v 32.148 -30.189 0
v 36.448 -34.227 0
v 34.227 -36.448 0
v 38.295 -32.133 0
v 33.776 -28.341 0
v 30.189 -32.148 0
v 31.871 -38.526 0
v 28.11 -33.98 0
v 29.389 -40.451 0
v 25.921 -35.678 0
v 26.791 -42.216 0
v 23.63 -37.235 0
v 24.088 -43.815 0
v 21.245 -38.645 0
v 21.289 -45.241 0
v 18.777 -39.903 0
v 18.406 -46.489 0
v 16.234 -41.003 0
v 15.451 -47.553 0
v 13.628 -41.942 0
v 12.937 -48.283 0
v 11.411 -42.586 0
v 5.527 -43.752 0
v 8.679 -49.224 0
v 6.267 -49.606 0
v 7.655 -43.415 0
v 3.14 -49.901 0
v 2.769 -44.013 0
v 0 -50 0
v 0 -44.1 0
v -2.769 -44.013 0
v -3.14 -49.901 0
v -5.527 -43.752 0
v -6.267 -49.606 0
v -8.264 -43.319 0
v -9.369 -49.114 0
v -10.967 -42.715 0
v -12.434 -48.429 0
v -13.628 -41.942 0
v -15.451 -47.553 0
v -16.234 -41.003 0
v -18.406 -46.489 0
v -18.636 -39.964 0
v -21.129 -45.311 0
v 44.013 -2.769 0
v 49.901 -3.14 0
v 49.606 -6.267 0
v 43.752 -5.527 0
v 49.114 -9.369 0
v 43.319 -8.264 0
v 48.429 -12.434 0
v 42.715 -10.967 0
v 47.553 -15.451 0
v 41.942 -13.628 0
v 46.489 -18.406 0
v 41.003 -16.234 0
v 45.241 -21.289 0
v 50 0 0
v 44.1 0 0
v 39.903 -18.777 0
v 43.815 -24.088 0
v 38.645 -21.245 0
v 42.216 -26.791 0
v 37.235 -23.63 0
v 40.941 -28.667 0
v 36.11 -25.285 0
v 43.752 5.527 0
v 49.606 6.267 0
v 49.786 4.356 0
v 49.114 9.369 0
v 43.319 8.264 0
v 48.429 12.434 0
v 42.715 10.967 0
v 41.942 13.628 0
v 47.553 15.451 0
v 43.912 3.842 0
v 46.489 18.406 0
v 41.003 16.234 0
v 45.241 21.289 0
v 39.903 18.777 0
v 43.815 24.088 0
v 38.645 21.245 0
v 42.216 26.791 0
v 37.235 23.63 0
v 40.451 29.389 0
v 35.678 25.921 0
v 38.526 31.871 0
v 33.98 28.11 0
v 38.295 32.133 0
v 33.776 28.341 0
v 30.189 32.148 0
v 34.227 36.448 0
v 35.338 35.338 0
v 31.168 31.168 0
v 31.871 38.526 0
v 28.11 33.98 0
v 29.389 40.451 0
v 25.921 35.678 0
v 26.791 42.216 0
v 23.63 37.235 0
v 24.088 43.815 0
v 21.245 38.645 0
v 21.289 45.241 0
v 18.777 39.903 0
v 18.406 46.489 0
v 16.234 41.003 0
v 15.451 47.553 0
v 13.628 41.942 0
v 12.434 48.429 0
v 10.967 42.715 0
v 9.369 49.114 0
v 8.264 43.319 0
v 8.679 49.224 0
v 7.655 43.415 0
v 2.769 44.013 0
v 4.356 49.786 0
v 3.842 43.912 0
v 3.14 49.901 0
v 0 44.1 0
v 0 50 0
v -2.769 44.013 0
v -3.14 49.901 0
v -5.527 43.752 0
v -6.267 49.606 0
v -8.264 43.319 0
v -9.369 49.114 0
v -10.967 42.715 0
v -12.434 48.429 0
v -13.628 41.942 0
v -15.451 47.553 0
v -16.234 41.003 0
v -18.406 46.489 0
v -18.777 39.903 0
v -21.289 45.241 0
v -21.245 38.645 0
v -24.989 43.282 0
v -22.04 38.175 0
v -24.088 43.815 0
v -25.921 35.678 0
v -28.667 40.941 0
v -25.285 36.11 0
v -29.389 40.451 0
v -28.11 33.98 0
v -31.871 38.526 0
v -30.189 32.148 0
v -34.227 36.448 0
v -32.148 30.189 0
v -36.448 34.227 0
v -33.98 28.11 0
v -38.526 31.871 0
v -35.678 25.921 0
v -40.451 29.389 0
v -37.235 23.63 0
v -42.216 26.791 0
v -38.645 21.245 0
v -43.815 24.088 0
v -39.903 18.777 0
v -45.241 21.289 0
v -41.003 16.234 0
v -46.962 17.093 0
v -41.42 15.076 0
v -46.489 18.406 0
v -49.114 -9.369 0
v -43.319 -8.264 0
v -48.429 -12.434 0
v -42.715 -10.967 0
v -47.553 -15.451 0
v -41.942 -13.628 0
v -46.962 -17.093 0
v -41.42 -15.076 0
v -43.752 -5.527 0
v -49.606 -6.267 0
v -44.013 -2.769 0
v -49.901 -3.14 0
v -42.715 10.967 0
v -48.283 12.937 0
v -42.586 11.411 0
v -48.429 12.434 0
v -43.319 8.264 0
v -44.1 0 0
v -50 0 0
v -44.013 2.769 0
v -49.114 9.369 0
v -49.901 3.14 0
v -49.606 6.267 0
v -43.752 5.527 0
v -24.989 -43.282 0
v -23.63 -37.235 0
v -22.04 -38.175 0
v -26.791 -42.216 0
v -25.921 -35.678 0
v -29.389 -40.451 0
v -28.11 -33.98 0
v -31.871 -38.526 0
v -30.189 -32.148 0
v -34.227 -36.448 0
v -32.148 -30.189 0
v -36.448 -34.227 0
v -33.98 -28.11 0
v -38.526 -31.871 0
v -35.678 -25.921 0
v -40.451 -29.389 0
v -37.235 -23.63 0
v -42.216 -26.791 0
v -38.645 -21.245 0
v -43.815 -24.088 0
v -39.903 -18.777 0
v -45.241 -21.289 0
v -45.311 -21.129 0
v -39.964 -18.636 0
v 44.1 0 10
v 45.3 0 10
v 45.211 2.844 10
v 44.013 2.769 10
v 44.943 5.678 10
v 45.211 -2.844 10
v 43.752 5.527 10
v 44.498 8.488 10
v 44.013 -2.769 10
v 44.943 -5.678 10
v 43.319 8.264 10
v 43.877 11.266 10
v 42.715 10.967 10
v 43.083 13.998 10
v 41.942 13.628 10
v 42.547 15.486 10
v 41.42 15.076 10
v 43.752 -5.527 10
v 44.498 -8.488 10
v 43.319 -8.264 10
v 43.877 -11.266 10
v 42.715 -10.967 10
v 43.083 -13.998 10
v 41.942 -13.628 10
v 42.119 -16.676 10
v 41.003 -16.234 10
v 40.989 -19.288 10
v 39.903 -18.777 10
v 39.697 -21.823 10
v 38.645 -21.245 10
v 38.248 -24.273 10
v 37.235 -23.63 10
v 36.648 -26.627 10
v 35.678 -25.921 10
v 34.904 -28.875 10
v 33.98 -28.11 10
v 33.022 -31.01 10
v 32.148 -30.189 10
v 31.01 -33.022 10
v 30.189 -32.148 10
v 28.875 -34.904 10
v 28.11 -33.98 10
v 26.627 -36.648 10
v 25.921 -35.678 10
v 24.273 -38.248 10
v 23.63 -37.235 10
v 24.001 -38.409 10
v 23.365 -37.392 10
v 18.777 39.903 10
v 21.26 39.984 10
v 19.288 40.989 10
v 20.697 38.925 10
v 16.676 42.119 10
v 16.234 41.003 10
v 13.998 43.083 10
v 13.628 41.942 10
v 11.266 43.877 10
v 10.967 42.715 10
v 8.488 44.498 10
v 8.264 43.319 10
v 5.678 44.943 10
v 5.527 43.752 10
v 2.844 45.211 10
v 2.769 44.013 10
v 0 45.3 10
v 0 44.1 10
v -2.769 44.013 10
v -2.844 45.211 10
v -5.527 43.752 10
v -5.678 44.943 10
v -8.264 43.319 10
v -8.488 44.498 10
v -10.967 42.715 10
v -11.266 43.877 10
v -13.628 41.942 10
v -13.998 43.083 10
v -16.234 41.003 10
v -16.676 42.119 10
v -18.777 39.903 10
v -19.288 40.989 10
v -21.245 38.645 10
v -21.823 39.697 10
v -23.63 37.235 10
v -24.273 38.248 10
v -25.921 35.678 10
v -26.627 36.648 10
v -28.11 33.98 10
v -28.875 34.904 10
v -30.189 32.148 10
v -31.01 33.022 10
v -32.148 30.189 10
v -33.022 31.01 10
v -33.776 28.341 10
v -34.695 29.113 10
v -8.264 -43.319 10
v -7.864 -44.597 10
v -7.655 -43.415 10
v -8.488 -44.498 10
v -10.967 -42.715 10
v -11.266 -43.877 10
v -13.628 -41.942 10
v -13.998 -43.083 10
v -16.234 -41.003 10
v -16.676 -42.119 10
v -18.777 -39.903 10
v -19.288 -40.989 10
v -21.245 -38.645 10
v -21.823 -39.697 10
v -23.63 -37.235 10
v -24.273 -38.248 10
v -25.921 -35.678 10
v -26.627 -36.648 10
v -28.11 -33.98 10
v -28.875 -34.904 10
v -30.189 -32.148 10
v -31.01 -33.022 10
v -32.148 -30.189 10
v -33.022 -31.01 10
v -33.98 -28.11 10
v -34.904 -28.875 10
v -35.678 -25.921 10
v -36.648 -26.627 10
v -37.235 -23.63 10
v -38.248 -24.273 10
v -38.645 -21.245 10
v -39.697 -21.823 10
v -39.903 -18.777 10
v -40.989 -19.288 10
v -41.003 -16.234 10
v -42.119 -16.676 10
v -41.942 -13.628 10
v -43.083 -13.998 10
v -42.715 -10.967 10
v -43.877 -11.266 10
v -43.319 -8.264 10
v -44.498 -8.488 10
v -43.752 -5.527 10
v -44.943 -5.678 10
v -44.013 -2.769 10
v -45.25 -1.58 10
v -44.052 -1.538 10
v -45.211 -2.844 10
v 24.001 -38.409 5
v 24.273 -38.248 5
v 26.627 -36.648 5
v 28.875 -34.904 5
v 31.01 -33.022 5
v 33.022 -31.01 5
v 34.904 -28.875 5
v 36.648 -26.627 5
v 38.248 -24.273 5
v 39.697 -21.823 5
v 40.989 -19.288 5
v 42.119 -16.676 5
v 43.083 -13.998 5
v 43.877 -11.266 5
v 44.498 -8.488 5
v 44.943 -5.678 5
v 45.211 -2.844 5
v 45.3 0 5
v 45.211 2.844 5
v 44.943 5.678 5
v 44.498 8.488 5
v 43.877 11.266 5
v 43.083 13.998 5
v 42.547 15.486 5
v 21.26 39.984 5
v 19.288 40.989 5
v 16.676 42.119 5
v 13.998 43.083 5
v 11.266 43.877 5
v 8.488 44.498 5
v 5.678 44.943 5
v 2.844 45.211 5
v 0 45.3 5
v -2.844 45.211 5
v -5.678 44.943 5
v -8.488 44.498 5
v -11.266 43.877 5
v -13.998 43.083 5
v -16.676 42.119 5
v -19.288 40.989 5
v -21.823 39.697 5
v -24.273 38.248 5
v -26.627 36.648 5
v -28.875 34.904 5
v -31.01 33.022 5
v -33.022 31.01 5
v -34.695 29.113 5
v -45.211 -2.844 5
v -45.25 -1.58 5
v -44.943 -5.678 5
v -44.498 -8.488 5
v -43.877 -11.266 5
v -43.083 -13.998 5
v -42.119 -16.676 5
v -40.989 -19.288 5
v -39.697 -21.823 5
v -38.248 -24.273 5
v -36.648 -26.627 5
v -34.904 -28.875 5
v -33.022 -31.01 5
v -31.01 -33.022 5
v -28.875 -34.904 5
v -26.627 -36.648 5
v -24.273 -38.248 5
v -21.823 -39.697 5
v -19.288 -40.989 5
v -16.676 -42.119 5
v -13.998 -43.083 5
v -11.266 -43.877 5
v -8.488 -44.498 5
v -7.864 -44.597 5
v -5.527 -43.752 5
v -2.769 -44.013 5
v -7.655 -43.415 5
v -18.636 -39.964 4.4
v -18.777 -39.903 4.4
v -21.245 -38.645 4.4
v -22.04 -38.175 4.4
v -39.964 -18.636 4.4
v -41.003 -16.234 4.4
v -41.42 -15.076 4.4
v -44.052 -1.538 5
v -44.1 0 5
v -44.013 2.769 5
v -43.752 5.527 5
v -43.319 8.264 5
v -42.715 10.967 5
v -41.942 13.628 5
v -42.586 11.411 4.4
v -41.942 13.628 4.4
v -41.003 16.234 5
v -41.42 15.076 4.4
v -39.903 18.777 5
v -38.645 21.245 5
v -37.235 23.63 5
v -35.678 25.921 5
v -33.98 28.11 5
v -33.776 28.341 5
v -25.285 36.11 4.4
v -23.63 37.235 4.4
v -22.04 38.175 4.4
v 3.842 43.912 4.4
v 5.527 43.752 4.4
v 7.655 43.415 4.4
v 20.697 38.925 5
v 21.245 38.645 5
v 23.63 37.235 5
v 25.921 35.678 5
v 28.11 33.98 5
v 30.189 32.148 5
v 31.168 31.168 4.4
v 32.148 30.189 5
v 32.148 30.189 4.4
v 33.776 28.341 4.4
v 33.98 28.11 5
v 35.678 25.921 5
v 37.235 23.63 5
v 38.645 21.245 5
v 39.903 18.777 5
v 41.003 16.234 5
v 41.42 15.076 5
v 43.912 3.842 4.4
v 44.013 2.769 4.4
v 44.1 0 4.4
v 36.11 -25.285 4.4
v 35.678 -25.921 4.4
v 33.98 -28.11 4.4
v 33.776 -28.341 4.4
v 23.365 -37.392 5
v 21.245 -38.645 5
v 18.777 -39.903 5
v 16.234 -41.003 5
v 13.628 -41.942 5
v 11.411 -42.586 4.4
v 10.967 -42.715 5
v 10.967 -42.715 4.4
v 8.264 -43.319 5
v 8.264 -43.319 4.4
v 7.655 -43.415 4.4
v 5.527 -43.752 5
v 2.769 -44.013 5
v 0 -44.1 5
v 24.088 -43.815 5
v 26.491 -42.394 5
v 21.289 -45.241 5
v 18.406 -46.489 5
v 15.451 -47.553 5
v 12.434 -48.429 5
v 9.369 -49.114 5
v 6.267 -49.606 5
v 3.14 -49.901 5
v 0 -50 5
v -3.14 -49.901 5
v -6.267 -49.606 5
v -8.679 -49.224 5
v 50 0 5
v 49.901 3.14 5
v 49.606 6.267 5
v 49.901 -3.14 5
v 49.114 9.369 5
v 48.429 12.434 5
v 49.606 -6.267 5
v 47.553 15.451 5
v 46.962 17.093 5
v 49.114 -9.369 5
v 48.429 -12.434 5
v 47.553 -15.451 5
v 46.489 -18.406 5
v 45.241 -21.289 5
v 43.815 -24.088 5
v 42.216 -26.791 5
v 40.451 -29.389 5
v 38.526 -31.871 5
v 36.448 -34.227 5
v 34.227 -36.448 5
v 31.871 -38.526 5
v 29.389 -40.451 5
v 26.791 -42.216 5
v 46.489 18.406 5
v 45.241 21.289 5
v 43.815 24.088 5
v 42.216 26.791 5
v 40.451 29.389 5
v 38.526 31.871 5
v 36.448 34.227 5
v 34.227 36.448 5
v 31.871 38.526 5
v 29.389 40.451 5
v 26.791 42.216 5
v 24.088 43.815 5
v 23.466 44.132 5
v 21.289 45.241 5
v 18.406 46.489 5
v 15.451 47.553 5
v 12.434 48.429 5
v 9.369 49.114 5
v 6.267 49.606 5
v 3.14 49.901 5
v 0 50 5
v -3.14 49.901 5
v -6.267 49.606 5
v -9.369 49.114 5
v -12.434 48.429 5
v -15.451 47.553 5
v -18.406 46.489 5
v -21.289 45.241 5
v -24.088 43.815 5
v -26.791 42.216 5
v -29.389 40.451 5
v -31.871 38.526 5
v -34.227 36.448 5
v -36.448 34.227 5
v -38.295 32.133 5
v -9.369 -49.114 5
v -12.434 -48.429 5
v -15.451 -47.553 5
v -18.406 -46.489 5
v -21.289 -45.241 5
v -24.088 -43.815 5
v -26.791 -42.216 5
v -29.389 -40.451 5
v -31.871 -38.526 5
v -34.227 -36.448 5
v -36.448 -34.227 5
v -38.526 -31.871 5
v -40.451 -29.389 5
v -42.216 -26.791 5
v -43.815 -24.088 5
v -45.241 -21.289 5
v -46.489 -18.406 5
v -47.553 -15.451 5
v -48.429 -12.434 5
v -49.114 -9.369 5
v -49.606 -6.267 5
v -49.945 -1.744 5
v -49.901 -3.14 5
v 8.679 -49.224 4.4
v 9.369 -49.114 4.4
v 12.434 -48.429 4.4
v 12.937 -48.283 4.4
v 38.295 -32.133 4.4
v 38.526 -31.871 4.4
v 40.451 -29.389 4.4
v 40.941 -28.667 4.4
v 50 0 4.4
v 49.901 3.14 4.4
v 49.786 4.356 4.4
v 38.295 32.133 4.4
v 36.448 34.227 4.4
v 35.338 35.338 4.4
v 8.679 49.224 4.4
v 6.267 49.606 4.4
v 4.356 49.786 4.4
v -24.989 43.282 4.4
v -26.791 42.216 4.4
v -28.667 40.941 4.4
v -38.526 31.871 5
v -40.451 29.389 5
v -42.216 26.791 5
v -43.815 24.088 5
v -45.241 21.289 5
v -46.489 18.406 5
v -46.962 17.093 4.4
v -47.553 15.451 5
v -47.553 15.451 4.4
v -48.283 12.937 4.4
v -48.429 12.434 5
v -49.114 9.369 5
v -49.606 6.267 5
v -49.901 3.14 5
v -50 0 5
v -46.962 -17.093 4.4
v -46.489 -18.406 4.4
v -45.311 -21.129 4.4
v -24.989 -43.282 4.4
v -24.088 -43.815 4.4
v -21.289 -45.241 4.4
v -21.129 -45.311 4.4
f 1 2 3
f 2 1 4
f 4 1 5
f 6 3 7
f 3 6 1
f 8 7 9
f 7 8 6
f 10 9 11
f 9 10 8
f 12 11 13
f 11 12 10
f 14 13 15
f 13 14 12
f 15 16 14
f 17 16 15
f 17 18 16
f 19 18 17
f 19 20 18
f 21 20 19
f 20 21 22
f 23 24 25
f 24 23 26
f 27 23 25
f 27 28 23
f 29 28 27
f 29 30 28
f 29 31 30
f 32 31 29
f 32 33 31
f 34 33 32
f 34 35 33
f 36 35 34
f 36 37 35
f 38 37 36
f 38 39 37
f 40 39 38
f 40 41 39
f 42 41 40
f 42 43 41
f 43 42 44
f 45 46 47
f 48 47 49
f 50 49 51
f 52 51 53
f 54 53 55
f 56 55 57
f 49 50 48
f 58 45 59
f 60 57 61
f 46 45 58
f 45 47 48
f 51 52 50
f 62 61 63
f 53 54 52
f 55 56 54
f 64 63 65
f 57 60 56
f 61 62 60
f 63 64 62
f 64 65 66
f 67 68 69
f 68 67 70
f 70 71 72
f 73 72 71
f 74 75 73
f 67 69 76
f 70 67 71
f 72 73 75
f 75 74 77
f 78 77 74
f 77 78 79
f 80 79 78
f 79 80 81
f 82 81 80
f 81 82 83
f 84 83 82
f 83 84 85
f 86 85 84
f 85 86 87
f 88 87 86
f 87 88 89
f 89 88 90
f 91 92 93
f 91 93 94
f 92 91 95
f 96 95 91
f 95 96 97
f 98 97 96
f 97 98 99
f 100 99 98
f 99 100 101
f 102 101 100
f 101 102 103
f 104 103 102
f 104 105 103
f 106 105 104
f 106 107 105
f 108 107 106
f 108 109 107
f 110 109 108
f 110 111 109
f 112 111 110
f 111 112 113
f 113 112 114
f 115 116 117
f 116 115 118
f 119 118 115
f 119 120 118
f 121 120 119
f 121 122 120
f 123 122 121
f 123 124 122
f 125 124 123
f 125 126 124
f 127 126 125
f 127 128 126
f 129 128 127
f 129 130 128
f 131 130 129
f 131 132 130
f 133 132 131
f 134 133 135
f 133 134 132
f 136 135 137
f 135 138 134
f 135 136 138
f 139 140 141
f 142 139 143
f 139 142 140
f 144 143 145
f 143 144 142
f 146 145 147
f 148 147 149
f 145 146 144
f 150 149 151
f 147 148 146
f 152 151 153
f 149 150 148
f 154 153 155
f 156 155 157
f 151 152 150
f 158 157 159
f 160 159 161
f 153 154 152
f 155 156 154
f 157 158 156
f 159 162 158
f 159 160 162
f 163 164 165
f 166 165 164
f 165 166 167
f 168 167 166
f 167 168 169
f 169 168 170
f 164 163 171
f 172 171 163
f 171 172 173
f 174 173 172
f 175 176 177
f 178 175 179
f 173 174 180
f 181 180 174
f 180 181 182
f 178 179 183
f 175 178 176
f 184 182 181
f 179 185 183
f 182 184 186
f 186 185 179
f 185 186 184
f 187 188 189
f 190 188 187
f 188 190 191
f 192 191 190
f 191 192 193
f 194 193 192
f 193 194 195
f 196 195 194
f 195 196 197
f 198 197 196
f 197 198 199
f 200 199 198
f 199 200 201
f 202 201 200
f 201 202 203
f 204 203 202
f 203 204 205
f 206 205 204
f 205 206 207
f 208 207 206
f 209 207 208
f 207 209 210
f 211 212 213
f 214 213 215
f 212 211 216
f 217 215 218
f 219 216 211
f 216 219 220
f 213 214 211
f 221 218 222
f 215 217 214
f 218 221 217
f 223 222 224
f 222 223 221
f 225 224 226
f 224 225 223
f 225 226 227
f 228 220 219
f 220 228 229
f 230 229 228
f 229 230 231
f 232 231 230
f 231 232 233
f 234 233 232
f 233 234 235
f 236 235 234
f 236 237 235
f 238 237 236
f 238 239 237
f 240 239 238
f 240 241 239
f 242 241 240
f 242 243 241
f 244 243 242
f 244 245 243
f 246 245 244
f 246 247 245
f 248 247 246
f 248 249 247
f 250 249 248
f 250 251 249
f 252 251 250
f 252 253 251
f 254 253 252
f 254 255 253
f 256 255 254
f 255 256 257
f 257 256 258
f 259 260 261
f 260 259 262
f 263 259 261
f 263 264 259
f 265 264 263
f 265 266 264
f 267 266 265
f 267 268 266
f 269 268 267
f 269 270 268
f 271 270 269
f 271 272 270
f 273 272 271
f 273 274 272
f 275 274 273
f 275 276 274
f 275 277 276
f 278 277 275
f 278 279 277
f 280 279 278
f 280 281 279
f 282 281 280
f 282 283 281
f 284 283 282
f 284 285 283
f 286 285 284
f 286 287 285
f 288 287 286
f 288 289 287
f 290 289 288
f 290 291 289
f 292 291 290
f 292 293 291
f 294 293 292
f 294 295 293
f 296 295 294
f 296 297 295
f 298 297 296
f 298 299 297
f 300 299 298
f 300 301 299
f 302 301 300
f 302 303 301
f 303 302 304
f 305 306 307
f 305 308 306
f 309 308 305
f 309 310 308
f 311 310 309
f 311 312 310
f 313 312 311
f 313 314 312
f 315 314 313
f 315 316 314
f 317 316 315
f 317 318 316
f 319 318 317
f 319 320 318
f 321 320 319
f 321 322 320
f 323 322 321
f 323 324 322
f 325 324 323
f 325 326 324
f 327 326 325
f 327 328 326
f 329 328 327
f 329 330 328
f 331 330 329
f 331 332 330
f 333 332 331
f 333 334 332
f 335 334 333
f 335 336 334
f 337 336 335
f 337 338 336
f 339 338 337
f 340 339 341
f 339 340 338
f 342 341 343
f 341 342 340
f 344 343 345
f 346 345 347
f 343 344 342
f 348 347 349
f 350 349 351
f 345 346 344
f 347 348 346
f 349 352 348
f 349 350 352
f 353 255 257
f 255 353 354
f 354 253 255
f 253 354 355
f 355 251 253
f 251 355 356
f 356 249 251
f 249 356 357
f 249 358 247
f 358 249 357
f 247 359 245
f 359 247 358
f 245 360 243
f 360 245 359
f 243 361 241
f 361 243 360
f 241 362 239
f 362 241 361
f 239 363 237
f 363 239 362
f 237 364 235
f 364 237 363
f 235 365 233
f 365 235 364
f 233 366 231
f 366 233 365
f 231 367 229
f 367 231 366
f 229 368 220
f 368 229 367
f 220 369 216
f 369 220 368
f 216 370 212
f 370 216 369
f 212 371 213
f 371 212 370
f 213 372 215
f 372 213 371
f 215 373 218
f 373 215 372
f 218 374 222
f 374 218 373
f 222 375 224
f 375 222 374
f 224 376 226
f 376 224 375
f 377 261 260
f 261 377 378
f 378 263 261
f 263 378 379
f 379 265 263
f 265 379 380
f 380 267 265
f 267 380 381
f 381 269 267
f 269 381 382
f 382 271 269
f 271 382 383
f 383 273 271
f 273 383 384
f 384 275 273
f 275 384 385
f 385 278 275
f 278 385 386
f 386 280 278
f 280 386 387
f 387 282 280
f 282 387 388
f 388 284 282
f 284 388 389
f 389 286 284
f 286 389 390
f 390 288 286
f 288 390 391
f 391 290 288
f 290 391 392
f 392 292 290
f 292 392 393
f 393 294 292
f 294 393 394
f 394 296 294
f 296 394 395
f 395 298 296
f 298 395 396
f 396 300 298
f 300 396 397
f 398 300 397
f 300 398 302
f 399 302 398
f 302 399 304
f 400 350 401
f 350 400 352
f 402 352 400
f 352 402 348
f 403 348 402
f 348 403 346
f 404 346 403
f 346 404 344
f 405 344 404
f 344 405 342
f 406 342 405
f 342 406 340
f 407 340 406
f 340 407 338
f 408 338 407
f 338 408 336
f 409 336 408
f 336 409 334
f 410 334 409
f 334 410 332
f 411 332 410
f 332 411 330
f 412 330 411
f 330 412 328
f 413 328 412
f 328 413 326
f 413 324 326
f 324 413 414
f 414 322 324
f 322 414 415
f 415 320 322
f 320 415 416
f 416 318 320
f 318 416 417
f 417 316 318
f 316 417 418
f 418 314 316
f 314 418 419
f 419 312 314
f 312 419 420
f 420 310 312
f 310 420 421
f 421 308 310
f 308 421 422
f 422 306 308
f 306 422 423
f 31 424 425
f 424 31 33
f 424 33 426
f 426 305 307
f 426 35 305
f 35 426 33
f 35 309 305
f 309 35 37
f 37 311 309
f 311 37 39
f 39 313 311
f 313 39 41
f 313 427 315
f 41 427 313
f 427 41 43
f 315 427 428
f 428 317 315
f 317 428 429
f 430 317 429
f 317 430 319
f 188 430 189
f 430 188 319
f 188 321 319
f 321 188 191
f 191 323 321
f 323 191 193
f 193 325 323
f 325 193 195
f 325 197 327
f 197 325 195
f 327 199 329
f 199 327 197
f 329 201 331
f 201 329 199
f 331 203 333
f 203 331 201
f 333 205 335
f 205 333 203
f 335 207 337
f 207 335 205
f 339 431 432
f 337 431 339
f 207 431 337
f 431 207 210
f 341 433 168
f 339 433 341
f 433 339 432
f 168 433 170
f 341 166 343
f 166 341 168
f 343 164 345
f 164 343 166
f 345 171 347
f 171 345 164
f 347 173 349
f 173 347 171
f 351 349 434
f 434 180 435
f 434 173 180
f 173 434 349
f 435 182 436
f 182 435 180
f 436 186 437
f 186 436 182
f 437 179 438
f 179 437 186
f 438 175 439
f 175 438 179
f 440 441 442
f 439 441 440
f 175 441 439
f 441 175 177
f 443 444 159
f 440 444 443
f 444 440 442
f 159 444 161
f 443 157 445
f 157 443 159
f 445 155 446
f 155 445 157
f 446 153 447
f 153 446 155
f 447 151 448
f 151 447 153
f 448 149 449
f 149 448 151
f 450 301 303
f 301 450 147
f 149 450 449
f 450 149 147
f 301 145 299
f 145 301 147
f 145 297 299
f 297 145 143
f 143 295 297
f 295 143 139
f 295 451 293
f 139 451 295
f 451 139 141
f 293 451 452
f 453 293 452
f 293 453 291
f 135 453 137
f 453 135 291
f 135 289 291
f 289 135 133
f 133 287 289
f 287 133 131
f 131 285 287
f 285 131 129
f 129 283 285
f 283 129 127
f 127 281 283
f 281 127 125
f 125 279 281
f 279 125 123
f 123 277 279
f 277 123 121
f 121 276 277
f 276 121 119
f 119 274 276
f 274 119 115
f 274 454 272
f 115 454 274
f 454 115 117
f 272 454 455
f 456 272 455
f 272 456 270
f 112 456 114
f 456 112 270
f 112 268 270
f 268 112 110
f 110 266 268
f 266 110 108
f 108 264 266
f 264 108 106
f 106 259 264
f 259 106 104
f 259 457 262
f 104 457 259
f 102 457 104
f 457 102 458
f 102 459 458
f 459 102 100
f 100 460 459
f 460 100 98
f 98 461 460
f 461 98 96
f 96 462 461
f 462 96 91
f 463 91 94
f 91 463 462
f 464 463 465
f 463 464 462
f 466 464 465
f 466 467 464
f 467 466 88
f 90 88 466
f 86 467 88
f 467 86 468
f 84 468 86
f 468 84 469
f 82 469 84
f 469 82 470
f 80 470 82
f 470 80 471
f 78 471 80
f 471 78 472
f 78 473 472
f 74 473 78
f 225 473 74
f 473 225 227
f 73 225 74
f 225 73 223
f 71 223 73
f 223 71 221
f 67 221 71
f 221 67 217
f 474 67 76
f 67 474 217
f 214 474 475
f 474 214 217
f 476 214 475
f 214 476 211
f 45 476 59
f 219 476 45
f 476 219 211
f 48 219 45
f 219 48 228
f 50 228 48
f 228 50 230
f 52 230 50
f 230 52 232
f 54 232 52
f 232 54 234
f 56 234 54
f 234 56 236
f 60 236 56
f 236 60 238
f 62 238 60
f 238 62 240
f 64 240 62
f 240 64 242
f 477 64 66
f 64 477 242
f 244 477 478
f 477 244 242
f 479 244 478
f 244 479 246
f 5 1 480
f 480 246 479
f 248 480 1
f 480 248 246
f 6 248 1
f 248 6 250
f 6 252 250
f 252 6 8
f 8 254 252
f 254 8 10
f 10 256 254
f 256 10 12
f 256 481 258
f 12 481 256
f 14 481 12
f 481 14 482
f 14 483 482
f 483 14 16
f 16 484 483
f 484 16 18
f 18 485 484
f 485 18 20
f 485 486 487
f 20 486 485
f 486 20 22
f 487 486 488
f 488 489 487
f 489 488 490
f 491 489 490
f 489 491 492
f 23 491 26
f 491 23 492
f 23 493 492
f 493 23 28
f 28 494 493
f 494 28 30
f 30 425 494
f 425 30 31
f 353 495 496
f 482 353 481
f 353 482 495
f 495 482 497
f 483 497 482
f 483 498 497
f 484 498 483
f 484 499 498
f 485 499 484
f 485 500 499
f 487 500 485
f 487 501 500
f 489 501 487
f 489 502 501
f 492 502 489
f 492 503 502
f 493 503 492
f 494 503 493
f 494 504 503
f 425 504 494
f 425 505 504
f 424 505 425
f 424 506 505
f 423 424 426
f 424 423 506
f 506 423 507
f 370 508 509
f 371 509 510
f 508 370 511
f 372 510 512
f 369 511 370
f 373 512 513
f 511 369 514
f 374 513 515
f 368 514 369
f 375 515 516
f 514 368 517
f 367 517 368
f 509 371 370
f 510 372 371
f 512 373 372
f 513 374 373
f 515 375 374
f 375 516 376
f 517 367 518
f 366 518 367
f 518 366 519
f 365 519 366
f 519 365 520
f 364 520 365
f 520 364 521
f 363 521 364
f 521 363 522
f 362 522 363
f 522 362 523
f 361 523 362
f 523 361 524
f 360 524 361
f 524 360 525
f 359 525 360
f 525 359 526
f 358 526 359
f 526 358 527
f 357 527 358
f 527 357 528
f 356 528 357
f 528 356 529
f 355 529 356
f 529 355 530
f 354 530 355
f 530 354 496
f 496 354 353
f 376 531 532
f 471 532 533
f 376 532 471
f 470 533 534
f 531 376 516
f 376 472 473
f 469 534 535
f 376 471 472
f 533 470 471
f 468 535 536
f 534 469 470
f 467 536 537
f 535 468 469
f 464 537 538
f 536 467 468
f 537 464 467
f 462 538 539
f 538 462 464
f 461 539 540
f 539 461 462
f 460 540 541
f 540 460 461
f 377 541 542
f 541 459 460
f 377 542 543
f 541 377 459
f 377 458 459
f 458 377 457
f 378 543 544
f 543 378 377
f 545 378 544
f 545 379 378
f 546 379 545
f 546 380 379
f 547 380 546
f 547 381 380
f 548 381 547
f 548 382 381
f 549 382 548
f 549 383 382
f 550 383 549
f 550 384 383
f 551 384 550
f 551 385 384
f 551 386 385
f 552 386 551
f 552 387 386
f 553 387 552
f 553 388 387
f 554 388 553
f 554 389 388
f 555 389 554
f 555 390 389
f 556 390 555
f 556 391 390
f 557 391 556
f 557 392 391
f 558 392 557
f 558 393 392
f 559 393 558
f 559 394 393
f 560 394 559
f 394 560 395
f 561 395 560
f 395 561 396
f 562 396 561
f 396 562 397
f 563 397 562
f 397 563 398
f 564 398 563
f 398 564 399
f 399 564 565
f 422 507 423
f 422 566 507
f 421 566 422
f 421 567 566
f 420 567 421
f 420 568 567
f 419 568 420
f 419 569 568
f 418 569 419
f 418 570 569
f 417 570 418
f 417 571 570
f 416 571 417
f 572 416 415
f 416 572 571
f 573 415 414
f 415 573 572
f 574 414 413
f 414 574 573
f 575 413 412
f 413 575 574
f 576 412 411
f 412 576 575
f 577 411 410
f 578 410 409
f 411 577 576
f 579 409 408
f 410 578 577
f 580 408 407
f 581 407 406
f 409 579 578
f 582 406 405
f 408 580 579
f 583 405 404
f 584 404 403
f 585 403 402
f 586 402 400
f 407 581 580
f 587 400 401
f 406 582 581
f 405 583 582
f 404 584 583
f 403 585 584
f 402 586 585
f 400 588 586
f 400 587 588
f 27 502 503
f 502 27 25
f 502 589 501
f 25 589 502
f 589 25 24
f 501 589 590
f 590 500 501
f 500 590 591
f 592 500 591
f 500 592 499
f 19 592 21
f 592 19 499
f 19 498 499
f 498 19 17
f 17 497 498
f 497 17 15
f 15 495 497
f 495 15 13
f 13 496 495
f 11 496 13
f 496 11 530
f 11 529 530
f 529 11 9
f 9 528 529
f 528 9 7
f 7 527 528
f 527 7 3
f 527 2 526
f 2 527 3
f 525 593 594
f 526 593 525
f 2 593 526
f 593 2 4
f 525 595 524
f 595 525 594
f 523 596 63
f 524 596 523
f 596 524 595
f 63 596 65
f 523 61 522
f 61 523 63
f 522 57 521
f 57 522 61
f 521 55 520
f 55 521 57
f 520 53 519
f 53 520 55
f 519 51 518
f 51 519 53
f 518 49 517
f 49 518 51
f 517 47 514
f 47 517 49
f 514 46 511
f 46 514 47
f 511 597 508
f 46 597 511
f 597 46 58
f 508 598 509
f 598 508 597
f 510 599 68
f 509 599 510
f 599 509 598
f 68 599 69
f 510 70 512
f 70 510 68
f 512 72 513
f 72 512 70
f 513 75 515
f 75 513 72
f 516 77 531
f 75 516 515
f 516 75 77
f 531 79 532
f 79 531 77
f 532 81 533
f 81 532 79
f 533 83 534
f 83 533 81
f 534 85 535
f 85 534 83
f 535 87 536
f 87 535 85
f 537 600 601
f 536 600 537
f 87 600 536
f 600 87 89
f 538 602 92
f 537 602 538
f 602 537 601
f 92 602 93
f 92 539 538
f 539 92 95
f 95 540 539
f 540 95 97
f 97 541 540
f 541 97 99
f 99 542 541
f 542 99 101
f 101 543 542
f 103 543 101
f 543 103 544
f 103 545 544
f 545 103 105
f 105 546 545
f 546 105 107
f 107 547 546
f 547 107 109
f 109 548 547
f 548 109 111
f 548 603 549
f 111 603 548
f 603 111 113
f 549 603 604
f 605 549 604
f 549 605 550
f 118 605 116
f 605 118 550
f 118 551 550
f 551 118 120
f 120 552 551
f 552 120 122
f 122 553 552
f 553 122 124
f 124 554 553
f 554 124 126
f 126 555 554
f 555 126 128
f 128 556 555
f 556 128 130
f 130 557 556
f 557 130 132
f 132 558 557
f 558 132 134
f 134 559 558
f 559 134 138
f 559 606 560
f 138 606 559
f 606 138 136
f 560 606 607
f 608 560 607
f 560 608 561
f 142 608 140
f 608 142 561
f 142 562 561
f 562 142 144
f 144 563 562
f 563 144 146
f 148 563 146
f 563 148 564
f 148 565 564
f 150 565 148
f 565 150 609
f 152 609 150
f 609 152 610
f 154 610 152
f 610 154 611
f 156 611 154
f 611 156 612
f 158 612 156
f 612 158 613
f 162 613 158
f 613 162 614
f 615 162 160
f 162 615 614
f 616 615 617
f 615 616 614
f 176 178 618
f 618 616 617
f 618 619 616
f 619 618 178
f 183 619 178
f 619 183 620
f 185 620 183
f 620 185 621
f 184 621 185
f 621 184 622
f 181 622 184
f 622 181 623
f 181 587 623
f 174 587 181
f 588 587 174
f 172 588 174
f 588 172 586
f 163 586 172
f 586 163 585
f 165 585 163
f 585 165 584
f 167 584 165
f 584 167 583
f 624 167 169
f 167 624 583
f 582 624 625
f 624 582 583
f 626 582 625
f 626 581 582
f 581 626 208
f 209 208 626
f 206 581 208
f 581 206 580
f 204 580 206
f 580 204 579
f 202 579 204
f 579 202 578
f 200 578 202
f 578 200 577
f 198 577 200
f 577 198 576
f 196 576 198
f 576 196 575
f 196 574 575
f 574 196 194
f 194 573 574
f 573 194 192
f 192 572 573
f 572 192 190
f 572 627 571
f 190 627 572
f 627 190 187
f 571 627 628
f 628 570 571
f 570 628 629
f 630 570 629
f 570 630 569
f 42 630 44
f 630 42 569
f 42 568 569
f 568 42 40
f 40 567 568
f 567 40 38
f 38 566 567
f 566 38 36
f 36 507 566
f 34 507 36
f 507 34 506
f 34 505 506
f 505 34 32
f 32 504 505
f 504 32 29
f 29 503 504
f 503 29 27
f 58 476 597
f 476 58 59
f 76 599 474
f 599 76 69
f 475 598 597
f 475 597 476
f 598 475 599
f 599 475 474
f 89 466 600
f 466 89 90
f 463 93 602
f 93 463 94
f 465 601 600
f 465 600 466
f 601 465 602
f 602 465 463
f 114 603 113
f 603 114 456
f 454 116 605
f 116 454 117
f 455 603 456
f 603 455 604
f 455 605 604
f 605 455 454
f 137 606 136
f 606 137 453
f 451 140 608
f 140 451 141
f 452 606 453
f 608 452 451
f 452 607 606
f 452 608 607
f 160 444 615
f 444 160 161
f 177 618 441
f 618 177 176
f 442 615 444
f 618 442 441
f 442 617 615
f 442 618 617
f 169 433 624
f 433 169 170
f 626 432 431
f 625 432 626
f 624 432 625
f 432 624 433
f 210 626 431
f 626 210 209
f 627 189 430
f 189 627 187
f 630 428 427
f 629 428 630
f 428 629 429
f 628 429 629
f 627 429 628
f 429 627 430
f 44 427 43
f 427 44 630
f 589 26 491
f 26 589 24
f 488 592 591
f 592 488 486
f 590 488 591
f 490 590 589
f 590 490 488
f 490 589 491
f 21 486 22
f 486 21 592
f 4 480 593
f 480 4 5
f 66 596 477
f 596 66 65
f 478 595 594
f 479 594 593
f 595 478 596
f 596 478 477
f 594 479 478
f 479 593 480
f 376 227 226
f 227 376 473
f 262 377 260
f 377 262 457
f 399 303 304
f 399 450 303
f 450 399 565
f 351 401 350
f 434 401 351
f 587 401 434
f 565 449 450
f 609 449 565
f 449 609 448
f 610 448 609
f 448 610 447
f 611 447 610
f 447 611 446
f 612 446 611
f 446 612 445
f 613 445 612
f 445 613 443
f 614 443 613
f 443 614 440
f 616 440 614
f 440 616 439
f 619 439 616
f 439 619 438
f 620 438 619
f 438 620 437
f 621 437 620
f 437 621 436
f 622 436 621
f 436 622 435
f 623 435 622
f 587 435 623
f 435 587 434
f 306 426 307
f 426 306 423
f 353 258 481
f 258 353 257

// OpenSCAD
outerDia=100;
innerDia=91;
spcng=0.2;
minWallThck=1.2;
minFloorThck=0.6;
rimHght=5;
ovHght=10;
ventOpnAng=5;
ventCount=9;
rimOpnAng=42;
rimOpnCnt=3;

/* [Hidden] */
$fn=100;
ventStpAng=360/ventCount;
rimStpAng=360/rimOpnCnt;
ringWdth=(outerDia-(innerDia-spcng*2-minWallThck*2))/2;
fudge=0.1;

difference(){
  ring();
  //vents
  for (i=[0:ventCount-1])
    rotate(i*ventStpAng) rotate_extrude(angle=ventOpnAng) translate([innerDia/2-minWallThck-spcng-fudge/2,-fudge]) 
      square([ringWdth+fudge,ovHght-rimHght-minFloorThck+fudge]);
  //opening in th erim
  for (i=[0:rimOpnCnt-1])
    rotate(i*rimStpAng+ventStpAng/2) rotate_extrude(angle=rimOpnAng) 
      translate([innerDia/2-spcng-fudge/2-minWallThck,ovHght-rimHght]) 
        square([ringWdth+fudge,ovHght-rimHght+fudge]);
}

module ring(){
  linear_extrude(ovHght) difference(){
    circle(d=innerDia-spcng*2);
    circle(d=innerDia-spcng*2-minWallThck*2);
  }
  linear_extrude(ovHght-rimHght) difference(){
    circle(d=outerDia);
    circle(d=innerDia-spcng*2-minWallThck*2);
  } 
}
